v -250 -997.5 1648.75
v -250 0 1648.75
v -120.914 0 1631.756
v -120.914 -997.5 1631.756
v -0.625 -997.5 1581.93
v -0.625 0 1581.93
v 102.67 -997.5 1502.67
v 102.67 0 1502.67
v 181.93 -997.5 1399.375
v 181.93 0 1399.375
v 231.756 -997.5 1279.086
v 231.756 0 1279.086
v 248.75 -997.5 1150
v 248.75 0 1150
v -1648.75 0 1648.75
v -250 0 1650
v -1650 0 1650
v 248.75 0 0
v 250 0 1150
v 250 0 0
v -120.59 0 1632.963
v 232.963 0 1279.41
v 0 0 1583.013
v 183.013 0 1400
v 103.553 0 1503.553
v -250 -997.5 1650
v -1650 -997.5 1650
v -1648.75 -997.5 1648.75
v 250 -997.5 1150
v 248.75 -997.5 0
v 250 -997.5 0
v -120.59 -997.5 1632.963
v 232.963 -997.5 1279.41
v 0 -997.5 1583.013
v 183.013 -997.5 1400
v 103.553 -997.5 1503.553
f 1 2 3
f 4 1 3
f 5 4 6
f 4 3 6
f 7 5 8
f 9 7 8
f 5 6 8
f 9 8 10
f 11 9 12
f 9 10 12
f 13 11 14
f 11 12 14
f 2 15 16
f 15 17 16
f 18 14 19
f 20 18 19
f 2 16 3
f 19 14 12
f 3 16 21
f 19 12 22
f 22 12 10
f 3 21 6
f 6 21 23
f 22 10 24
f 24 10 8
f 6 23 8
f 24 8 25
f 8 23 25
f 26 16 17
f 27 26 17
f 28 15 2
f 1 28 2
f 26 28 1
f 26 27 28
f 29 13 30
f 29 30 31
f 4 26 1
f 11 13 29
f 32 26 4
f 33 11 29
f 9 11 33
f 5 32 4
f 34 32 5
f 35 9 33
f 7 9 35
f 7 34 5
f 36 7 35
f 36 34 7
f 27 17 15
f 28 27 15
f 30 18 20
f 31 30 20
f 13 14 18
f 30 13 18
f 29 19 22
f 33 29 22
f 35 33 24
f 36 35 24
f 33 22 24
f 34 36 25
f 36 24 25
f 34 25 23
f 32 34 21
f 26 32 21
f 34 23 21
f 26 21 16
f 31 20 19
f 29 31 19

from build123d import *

# Parameters (mm, degrees)
F1_DEPTH = 997.5


with BuildPart() as f1:
    # F0 (on Front) → F1 (new body)
    with BuildSketch(Plane.XZ):
        Polygon((-1648.75, 1648.75), (-950, 1648.75), (-950, 1650), (-1650, 1650), align=None)
        with BuildLine():
            Line((248.75, 1150), (248.75, 0))
            Line((248.75, 0), (250, 0))
            Line((250, 0), (250, 1150))
            ThreePointArc((250, 1150), (103.553391, 1503.553391), (-250, 1650))
            Line((-250, 1650), (-950, 1650))
            Line((-950, 1650), (-950, 1648.75))
            Line((-950, 1648.75), (-250, 1648.75))
            ThreePointArc((-250, 1648.75), (102.669507, 1502.669507), (248.75, 1150))
        make_face()
    extrude(amount=F1_DEPTH)


solid = f1.part
